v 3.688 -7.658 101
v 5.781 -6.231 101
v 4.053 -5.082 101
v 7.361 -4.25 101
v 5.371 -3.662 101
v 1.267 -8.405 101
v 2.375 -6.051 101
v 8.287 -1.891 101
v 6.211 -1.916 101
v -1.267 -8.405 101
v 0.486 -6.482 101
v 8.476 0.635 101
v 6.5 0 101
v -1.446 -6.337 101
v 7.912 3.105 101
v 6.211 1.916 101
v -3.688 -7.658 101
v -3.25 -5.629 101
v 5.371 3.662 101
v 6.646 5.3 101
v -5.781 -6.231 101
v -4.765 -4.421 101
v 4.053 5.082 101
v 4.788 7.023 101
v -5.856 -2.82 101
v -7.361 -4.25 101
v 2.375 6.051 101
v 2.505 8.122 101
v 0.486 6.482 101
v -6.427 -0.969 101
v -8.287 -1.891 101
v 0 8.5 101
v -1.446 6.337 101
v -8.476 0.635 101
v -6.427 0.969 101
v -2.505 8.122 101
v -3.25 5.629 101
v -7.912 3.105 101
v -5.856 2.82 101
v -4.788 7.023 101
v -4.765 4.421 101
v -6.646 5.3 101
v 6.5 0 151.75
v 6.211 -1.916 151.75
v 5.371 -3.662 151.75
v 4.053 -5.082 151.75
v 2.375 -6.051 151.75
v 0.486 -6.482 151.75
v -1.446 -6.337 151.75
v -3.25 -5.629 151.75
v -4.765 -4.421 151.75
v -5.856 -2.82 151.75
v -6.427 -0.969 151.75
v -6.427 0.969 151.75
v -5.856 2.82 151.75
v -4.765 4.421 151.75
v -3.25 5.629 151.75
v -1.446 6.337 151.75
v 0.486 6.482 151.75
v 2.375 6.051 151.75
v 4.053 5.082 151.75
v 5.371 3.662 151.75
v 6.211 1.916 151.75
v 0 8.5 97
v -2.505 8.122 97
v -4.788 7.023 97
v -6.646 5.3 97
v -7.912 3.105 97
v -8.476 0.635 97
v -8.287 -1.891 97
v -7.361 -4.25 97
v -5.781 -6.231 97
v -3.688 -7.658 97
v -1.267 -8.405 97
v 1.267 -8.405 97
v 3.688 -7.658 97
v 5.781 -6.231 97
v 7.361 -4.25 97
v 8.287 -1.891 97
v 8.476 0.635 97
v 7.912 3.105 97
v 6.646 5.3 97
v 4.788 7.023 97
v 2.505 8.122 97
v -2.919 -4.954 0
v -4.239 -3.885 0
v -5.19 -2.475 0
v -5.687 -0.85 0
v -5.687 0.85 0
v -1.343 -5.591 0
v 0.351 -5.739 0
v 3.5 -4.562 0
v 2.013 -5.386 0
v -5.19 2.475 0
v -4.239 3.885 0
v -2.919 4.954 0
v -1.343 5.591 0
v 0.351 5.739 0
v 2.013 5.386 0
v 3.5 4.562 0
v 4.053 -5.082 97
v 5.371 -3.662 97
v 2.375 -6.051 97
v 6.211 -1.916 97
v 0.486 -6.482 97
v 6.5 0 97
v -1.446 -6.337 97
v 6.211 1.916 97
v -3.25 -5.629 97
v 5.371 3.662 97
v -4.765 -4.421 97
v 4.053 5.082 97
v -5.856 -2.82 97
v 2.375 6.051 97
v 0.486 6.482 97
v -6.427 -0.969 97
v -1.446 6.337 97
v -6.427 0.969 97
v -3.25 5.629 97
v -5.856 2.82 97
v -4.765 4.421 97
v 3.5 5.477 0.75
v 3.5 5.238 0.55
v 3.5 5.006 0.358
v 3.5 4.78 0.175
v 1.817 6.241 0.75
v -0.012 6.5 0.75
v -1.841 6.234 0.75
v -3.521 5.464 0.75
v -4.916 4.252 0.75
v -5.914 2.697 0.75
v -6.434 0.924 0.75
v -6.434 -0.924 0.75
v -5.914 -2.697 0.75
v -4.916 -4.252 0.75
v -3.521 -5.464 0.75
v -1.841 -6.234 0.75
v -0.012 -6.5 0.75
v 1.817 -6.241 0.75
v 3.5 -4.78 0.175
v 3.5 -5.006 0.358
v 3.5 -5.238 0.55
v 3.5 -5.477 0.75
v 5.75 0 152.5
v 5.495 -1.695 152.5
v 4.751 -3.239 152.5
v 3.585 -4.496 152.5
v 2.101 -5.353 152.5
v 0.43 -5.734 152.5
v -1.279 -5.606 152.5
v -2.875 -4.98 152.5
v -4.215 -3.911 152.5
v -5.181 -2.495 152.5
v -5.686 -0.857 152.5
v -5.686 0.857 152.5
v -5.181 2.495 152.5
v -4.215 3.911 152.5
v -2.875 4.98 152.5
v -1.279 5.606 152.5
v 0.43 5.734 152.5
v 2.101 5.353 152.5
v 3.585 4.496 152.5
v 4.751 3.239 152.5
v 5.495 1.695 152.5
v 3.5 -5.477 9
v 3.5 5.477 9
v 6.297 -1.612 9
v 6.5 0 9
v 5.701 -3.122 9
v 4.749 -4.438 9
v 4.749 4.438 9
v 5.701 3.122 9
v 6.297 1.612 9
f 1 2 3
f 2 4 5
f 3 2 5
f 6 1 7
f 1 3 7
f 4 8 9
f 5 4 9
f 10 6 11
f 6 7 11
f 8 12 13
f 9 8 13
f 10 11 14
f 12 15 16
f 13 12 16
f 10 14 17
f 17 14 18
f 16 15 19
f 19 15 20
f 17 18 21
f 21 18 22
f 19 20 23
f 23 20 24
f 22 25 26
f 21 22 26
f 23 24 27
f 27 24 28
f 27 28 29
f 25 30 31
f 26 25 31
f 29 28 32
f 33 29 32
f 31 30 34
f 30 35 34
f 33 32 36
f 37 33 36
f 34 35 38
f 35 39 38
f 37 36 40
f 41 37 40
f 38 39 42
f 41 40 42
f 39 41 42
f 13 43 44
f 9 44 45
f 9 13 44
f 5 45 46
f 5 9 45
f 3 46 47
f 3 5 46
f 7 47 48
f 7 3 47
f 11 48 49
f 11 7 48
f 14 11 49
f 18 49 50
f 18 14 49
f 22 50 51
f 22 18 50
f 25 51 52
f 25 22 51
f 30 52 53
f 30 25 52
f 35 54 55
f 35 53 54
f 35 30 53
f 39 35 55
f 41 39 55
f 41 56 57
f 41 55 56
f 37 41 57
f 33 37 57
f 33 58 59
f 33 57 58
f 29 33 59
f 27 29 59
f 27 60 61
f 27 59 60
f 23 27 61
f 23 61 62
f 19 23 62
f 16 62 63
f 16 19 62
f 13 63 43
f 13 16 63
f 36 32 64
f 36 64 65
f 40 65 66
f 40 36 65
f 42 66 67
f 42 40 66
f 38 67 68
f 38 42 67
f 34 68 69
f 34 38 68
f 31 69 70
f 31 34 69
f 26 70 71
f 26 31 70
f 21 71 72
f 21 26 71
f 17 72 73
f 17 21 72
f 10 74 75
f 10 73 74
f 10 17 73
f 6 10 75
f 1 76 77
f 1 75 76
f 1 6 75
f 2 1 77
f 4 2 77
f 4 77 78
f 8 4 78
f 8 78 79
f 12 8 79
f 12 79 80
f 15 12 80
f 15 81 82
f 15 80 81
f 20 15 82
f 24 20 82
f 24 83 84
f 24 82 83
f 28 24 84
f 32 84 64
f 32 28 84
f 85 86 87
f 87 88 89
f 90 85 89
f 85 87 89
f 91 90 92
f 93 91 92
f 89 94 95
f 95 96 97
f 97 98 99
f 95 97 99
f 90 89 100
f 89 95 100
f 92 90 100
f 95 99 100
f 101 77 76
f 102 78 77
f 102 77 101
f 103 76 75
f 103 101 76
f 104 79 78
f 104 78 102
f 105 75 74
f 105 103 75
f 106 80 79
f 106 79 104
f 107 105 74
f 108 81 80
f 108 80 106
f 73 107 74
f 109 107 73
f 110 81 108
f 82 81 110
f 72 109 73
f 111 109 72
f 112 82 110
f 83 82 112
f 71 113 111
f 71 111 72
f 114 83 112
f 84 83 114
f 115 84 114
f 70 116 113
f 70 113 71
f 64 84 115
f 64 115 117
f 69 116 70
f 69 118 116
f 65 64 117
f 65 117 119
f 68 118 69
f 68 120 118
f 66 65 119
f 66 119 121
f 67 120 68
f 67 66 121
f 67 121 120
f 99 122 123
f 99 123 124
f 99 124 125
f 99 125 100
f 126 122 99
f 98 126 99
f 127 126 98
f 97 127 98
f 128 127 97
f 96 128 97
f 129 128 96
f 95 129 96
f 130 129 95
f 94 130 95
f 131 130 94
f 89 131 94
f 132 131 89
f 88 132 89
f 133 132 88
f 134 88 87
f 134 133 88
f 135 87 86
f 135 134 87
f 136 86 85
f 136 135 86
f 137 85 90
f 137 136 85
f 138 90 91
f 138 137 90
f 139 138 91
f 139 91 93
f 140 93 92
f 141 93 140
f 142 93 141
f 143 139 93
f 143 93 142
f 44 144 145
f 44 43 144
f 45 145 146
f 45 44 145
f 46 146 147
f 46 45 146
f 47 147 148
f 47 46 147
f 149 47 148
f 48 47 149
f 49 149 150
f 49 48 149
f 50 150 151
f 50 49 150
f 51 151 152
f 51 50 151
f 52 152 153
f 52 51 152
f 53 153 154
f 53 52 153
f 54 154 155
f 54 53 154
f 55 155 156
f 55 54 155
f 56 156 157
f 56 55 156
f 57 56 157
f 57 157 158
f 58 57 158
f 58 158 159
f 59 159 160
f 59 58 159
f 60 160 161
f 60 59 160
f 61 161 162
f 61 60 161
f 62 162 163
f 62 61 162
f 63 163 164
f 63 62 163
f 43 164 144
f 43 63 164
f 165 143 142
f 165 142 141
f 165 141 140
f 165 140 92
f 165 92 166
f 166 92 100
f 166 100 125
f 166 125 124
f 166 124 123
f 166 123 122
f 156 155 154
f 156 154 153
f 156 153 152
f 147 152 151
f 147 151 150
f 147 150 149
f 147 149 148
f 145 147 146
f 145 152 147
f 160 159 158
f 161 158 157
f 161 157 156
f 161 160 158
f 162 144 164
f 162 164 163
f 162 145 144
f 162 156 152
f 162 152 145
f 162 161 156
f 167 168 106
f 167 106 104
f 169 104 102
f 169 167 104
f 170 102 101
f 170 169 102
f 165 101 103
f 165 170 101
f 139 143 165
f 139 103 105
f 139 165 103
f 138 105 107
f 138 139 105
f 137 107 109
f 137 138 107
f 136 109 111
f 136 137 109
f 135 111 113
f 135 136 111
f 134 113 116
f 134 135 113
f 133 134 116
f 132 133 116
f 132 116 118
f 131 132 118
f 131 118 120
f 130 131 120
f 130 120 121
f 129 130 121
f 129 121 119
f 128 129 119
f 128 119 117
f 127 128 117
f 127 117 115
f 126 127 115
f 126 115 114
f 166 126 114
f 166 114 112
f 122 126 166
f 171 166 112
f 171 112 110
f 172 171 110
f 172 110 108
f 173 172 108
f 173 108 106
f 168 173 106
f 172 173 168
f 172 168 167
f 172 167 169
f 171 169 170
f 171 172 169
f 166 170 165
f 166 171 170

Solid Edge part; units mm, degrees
sketch "Sketch1" plane through (0, 0, 0) normal (0, 0, 1) x (1, 0, 0)
  circle A0 centre (0, 0) radius 6.5
  dimension "D1" = 13
extrude "Protrusion1" add sketch "Sketch1" along normal blind 152.5
sketch "Sketch2" plane through (0, 0, 0) normal (0, 0, -1) x (1, 0, 0)
  line L0 (3.5, 5.4772) -> (3.5, -5.4772)
  dimension "D1" = 3.5
extrude "ExtrudedCutout_1" cut sketch "Sketch2" against normal blind 9 material side at (3.55, 0, 0)
chamfer "Chamfer_1" distance 0.75 angle 45 2 edges at (-6.5, 0, 0) (-6.5, 0, 152.5)
sketch "Sketch3" plane through (5, 0, 101) normal (0, 0, -1) x (0, 1, 0)
  circle A0 centre (0, -5) radius 8.5
  dimension "D1" = 17
extrude "ExtrudedProtrusion_2" add sketch "Sketch3" along normal blind 4
properties part number "SV-101" material "STEEL, 4140"
